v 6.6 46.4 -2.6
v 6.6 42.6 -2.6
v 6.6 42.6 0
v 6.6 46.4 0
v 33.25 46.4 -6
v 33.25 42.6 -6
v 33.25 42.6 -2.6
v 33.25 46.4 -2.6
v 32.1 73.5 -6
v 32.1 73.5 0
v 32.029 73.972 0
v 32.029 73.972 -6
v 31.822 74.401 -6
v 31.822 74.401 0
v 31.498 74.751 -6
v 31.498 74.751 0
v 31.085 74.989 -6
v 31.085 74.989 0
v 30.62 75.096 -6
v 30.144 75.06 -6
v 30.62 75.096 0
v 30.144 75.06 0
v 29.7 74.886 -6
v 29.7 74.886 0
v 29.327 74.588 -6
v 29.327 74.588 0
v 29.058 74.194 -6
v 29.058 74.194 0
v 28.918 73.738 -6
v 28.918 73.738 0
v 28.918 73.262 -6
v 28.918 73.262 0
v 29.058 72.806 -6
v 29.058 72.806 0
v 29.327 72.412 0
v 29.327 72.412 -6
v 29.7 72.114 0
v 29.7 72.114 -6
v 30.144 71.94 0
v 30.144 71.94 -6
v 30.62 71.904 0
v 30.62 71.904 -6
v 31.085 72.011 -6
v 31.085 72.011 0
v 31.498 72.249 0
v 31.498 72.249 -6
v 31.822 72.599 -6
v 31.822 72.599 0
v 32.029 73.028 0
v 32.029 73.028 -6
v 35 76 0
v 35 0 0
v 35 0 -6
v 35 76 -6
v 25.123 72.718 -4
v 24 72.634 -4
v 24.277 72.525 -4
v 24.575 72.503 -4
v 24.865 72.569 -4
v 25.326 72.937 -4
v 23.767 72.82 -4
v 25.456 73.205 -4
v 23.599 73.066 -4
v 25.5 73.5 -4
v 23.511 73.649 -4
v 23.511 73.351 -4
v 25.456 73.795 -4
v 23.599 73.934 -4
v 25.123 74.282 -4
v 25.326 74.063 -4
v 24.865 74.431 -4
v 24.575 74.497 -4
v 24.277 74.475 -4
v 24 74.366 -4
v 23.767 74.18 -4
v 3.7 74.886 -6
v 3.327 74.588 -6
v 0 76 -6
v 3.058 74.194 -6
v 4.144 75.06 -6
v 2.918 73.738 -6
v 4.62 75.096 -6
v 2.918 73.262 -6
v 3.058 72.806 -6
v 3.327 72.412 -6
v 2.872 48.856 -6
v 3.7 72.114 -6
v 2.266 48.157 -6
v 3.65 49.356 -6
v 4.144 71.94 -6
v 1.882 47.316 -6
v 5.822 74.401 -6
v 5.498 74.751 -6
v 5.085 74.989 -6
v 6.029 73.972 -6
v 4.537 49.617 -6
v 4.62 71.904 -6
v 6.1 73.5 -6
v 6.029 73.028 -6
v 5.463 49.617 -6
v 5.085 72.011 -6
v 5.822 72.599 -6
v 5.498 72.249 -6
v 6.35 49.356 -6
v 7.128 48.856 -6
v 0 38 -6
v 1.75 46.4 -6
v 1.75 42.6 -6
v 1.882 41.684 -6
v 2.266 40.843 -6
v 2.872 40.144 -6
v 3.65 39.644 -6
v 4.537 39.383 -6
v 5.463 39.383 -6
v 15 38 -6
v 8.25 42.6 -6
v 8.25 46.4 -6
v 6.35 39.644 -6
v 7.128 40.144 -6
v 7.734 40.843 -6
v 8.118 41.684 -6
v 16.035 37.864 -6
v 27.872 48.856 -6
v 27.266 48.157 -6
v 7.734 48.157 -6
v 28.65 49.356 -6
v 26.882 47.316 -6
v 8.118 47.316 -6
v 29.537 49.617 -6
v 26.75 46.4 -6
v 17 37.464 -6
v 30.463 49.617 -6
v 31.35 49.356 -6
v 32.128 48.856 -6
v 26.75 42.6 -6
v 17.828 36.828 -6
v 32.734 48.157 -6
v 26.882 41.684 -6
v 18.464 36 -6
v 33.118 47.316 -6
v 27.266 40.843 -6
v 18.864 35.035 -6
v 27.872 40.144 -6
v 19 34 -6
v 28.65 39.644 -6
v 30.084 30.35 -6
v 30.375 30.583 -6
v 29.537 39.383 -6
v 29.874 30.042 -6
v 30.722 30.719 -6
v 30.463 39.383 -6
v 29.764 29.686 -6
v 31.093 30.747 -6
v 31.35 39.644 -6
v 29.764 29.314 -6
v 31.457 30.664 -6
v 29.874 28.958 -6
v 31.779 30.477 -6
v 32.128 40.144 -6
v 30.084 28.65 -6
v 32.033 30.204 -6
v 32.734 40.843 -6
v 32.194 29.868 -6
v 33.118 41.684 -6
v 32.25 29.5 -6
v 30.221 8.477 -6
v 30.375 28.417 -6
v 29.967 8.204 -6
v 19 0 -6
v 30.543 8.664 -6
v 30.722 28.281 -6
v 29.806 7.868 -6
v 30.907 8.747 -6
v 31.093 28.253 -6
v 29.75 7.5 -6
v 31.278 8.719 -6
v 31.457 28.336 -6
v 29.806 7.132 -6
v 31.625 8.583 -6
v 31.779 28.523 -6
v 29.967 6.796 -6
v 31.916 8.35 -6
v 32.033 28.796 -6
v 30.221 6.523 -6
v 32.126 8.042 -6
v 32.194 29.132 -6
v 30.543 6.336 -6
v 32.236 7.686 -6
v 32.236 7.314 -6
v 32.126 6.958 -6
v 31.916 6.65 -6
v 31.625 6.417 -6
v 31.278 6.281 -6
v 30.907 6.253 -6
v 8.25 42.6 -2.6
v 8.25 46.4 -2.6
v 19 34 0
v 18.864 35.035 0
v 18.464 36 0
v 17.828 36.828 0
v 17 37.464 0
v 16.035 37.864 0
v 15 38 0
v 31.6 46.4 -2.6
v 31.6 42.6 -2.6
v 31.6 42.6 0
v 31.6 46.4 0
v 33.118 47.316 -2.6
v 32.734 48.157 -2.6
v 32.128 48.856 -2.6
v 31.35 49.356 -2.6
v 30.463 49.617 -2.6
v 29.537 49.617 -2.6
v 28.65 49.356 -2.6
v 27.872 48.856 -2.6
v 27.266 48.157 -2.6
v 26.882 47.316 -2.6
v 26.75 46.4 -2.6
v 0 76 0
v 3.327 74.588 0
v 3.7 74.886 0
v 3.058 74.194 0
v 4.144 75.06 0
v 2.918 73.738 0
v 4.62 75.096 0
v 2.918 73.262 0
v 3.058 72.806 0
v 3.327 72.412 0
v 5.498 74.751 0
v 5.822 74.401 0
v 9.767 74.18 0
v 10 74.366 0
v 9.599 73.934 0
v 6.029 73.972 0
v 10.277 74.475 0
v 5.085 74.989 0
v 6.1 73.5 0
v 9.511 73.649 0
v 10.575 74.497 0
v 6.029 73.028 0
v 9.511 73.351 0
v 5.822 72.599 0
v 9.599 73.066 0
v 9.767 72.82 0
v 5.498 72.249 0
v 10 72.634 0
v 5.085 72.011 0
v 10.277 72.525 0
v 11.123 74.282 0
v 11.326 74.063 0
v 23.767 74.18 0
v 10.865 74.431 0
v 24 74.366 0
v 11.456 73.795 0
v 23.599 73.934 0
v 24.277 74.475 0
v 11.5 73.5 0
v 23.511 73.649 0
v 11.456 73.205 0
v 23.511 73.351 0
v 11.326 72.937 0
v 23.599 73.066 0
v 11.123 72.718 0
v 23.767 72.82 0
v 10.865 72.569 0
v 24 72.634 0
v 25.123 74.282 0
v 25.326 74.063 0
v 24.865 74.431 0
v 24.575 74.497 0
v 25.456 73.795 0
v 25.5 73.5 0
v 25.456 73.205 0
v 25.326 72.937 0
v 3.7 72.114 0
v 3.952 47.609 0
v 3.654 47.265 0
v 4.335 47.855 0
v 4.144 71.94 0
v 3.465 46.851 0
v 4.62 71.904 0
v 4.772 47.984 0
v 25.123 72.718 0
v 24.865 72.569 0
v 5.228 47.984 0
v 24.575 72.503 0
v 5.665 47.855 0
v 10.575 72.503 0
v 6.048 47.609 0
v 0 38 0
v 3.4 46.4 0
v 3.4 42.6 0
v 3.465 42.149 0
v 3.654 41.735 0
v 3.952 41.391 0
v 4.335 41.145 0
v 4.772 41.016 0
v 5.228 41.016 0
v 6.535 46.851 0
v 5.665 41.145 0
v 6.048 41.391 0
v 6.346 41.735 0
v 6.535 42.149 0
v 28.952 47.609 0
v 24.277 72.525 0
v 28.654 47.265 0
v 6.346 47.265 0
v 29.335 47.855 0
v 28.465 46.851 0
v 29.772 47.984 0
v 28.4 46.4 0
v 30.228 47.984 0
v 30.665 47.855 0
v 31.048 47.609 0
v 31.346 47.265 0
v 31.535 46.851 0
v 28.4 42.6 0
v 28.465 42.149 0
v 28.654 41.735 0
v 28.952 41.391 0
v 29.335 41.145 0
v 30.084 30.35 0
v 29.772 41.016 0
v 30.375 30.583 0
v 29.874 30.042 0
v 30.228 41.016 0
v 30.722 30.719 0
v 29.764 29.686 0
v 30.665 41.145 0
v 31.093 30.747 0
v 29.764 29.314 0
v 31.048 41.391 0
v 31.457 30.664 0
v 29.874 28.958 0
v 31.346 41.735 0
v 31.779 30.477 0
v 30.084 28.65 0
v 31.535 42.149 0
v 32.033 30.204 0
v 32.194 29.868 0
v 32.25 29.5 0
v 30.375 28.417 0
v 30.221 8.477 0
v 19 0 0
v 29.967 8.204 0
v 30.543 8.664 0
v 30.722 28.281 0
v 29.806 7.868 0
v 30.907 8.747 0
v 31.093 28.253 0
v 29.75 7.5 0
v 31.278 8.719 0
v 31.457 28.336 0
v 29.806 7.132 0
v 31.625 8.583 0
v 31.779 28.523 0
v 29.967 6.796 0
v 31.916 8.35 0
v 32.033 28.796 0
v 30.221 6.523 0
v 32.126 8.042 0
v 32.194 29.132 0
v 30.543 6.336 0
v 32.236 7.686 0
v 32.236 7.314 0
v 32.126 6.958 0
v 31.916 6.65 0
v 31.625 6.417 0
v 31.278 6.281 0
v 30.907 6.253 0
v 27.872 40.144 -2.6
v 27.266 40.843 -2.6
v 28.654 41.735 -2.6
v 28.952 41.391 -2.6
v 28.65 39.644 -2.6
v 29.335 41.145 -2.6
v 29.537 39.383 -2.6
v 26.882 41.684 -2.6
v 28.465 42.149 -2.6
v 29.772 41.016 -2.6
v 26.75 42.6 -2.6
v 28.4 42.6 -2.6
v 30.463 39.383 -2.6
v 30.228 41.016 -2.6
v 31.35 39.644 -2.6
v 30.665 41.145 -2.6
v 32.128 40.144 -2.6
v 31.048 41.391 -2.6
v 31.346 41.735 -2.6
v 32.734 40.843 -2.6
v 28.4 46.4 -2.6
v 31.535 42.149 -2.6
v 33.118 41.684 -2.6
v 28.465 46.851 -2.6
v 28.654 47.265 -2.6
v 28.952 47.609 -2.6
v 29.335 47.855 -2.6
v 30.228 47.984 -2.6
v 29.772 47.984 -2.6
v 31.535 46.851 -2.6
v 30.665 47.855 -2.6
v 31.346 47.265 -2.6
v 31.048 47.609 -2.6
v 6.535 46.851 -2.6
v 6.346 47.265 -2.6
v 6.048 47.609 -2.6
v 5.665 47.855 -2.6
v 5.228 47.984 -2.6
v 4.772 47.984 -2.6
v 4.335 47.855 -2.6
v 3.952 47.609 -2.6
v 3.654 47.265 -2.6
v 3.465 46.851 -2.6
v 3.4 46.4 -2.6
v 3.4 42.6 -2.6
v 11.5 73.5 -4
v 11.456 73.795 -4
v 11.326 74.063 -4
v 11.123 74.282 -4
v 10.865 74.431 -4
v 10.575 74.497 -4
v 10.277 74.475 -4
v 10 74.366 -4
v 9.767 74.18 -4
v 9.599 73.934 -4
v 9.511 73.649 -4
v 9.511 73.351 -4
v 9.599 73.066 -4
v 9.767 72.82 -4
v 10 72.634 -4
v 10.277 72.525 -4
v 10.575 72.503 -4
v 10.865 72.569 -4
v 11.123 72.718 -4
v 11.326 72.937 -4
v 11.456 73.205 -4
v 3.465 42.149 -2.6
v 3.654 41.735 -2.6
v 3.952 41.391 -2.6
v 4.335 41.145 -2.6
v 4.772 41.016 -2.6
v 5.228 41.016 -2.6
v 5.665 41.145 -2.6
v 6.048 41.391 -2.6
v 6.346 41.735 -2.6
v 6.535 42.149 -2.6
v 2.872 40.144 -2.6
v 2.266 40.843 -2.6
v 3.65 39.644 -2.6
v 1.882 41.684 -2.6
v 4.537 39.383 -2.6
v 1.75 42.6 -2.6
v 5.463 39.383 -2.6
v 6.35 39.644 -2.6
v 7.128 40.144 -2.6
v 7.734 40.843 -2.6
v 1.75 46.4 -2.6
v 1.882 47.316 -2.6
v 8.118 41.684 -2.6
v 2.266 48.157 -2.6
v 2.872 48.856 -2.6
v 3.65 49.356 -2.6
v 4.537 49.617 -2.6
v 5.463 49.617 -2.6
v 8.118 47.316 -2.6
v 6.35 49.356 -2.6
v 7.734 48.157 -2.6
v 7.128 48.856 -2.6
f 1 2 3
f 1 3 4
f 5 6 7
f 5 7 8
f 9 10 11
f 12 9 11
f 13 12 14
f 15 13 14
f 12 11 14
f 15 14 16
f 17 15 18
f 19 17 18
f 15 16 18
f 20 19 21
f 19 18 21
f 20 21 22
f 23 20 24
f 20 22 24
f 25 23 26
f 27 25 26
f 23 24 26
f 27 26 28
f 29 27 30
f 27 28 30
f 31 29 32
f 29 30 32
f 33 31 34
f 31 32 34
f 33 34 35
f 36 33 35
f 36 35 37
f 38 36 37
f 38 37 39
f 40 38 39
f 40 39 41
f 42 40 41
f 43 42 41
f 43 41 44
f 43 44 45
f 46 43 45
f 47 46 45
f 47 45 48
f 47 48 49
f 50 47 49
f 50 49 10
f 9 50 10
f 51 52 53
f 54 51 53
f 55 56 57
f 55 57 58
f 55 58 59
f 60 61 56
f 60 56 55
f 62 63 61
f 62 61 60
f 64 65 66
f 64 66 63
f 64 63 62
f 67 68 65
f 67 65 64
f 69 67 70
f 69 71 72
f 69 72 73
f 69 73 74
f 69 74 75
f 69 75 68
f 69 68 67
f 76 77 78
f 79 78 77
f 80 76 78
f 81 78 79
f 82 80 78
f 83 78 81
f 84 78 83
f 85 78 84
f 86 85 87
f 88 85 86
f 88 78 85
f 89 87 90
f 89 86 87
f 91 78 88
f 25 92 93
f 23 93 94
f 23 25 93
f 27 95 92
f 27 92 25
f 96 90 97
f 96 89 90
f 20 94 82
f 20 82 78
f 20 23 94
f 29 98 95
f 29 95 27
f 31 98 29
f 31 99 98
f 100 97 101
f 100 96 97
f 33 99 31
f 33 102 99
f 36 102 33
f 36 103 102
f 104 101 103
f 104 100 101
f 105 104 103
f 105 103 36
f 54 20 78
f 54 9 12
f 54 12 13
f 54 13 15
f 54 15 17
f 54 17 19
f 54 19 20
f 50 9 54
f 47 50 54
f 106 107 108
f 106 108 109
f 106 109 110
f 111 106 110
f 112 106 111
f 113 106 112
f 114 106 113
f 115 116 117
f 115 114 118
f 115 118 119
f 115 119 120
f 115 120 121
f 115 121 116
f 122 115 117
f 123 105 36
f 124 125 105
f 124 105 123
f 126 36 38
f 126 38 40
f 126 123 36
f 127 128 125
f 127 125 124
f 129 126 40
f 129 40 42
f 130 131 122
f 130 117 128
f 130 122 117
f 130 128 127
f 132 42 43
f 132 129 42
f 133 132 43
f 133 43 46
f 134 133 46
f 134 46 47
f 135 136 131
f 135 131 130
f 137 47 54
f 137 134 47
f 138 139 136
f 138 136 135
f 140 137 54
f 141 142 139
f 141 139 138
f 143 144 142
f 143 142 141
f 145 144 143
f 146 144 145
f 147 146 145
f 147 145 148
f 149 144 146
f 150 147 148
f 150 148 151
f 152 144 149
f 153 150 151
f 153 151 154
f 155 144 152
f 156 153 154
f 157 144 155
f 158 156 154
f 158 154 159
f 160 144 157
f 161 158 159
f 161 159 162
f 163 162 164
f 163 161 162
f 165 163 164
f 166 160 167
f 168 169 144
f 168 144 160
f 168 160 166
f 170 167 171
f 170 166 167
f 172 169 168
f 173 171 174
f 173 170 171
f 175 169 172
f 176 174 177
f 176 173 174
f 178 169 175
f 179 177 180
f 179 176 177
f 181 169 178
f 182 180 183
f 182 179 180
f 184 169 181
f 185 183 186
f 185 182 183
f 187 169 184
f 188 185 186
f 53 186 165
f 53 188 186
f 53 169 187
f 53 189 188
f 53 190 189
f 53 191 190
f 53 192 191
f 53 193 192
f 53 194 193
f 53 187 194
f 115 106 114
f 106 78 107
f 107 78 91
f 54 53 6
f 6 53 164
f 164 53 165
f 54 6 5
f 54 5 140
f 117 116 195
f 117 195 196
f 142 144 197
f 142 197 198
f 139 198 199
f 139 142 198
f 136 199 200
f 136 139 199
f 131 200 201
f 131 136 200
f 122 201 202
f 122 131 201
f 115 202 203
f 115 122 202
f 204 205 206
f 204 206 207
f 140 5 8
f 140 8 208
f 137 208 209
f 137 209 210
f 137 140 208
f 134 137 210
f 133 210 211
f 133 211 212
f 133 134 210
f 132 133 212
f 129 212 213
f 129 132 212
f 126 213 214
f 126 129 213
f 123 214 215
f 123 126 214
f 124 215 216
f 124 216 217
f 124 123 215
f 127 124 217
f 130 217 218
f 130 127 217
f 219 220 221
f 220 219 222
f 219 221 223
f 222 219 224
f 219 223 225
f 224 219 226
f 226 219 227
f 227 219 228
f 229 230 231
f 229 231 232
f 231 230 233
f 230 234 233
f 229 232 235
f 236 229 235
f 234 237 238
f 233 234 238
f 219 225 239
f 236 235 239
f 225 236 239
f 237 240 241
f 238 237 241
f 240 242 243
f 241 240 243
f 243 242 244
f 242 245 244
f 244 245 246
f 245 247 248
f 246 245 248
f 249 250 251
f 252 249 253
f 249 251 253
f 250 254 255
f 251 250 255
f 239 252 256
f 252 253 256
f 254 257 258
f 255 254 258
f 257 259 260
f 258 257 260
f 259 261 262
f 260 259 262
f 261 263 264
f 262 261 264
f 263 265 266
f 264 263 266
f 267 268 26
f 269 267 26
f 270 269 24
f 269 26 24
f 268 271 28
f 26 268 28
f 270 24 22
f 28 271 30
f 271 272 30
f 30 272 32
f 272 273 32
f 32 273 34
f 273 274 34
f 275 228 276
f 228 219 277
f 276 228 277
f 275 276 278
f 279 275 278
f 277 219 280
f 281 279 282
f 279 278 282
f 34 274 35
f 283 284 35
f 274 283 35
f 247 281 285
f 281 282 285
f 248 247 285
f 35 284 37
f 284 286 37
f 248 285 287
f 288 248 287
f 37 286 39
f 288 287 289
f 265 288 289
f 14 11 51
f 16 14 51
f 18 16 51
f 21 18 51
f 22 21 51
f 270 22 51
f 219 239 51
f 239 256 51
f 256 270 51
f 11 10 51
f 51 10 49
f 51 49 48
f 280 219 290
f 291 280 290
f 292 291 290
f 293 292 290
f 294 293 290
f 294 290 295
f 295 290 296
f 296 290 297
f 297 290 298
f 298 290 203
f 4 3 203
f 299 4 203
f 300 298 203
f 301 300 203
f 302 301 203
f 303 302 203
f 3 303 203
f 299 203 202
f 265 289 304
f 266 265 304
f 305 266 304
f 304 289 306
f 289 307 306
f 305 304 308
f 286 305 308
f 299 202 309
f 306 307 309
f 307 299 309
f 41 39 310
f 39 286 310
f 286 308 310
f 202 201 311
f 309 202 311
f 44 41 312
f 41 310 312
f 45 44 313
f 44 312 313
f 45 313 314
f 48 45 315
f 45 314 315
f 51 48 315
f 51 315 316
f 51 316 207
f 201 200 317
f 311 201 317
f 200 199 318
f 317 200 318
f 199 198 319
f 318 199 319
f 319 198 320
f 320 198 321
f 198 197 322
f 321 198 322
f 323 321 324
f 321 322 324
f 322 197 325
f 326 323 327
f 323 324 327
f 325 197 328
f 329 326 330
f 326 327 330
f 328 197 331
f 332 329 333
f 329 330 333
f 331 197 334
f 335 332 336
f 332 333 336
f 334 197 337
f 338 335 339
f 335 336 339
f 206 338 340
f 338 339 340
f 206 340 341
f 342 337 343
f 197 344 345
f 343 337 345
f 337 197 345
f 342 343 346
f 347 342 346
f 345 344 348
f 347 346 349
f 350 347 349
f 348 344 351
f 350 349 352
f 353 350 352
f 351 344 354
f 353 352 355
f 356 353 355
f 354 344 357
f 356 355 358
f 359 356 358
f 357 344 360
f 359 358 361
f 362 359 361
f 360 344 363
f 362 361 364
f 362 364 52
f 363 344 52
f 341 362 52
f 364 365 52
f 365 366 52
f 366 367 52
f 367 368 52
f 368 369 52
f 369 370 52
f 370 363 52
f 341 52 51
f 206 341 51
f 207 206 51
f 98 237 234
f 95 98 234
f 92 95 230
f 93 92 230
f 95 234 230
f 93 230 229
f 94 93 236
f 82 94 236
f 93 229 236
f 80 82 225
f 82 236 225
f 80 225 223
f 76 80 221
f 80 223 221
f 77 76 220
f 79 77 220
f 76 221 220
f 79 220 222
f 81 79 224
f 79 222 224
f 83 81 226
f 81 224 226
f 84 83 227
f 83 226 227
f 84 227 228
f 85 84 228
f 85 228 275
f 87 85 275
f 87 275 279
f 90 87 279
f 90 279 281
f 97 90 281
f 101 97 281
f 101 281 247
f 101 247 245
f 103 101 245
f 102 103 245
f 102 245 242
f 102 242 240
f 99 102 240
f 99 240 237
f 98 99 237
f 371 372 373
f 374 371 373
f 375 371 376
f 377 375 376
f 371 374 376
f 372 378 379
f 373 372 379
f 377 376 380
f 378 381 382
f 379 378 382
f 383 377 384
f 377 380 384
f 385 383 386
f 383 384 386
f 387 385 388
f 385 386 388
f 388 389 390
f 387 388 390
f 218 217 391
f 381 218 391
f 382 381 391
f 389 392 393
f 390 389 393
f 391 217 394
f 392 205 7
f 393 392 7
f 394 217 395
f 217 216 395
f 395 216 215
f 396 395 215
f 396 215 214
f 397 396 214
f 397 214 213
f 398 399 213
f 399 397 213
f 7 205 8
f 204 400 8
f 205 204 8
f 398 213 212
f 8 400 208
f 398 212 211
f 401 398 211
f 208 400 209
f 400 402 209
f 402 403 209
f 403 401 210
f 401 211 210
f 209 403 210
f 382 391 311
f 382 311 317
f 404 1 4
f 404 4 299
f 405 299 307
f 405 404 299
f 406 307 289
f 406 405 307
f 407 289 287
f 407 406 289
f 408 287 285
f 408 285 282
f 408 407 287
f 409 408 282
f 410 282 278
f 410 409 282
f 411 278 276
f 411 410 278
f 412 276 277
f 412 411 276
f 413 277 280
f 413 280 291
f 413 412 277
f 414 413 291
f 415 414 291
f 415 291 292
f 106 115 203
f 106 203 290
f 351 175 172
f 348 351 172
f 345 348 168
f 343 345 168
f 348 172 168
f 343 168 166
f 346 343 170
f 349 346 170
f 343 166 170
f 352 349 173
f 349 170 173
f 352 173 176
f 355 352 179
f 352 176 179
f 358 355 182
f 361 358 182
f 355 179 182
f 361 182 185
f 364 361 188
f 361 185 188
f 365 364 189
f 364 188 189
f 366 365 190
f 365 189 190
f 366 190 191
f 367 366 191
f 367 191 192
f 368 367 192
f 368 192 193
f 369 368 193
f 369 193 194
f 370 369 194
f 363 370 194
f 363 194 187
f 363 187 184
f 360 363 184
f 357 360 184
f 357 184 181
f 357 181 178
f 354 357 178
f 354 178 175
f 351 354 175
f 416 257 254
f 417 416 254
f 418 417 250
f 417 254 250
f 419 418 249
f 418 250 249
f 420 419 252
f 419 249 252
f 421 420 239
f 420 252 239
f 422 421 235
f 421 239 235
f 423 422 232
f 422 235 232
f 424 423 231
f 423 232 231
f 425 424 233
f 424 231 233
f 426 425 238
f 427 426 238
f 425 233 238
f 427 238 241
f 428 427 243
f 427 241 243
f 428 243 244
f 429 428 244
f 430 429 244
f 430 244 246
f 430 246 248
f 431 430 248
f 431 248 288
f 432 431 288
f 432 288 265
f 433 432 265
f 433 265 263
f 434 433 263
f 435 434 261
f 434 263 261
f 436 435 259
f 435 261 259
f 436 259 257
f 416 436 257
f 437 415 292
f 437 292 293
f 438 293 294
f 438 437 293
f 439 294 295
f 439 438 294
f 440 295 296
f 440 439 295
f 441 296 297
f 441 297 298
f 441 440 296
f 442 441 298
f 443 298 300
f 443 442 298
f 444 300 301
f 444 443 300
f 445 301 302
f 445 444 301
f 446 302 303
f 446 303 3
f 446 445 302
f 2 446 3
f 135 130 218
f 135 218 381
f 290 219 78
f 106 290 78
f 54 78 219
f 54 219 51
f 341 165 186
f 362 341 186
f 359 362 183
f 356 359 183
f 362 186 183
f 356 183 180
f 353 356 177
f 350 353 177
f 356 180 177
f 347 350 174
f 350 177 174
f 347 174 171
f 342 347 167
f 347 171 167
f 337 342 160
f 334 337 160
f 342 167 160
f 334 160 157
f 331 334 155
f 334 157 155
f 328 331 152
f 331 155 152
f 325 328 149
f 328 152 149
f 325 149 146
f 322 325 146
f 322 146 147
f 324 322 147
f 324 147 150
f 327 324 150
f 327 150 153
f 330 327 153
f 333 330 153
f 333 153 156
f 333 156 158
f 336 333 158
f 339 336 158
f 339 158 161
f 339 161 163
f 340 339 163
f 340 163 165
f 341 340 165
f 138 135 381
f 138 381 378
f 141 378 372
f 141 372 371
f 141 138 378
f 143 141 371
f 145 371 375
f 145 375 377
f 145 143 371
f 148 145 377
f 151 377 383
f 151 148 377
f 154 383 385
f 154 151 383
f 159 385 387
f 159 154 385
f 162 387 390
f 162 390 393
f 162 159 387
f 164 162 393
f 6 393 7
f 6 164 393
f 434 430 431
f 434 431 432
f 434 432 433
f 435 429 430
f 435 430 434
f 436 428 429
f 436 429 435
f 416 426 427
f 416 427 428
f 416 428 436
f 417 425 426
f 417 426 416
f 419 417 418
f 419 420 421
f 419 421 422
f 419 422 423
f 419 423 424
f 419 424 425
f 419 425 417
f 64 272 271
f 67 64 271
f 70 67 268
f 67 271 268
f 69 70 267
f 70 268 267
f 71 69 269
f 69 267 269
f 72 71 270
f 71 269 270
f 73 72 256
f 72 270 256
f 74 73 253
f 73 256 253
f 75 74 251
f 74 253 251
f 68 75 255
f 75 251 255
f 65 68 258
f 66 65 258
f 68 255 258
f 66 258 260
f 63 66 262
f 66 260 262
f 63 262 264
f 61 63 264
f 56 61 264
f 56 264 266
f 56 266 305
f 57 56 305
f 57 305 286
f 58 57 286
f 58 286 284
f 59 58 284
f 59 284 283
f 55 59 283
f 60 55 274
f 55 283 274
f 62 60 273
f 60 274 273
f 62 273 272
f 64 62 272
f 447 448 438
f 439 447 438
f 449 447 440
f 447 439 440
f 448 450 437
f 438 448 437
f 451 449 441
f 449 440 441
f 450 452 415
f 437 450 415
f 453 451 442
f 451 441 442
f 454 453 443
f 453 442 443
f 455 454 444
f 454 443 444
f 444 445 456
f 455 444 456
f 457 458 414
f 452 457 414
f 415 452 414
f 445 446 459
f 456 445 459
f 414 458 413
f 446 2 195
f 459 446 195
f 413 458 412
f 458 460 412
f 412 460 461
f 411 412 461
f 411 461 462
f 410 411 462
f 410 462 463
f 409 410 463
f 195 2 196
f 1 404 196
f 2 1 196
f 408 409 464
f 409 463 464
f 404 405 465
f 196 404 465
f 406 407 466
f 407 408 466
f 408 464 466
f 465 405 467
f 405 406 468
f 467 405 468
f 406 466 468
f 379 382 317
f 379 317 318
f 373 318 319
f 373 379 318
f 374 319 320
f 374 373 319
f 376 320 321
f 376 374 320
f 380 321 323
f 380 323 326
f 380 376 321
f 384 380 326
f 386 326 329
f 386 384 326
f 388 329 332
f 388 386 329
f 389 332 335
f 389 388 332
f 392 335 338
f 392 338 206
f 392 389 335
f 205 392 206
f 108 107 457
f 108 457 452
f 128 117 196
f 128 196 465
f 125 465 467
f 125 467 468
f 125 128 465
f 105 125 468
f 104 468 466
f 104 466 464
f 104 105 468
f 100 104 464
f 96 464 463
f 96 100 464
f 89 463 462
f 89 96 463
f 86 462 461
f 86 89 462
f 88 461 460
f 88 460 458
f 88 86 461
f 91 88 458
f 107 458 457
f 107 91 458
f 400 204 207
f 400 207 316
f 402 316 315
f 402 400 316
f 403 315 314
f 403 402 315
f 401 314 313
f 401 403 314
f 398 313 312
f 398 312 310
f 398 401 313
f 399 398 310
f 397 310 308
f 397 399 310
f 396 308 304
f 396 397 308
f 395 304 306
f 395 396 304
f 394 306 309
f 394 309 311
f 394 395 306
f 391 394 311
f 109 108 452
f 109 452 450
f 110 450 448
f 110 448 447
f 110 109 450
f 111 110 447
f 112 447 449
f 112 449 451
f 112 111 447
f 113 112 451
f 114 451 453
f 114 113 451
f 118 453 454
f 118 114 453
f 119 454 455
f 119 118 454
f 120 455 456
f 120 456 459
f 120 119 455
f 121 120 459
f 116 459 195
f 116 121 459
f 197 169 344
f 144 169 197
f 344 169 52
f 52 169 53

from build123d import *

# Parameters (mm, degrees)
SKETCH1_W                                      = 35
SKETCH1_H                                      = 6
BOSS_EXTRUDE1_DEPTH                            = 76
SKETCH2_R                                      = 1.6
CUT_EXTRUDE1_DEPTH                             = 84.886828525
SKETCH3_R                                      = 1
CUT_EXTRUDE2_DEPTH                             = 4
CBORE_START                                    = -6
CBORE_SLOT_FOR_M3_HEX_SOCKET_HEAD_CAP_SC_DEPTH = 3.4
CBORE_START_2                                  = -2.6
CBORE_SLOT_FOR_M3_HEX_SOCKET_HEAD_CA_3_DEPTH   = 2.6
CUT_EXTRUDE3_DEPTH                             = 84.886828525
SKETCH8_R                                      = 1.25
CUT_EXTRUDE4_DEPTH                             = 84.886828525


# Read off the part's stored shape, not the designer's step: CBORE SLOT for M3 Hex Socket Head Cap Screw1
with BuildPart() as part:
    # Sketch1 → Boss-Extrude1 (new body)
    with BuildSketch(Plane(origin=(0, 0, 0), x_dir=(1, 0, 0), z_dir=(0, 1, 0))):
        with Locations((17.5, 3)):
            Rectangle(SKETCH1_W, SKETCH1_H)
    extrude(amount=BOSS_EXTRUDE1_DEPTH)

    # Sketch2 → Cut-Extrude1 (cut, through all)
    with BuildSketch(Plane.XY):
        with Locations((4.5, 73.5)):
            Circle(SKETCH2_R)
        with Locations((30.5, 73.5)):
            Circle(SKETCH2_R)
    extrude(amount=-CUT_EXTRUDE1_DEPTH, mode=Mode.SUBTRACT)

    # Sketch3 → Cut-Extrude2 (cut)
    with BuildSketch(Plane.XY):
        with Locations((10.5, 73.5)):
            Circle(SKETCH3_R)
        with Locations((24.5, 73.5)):
            Circle(SKETCH3_R)
    extrude(amount=-CUT_EXTRUDE2_DEPTH, mode=Mode.SUBTRACT)

    # CBORE SLOT for M3 Hex Socket Head Ca 2 → CBORE SLOT for M3 Hex Socket Head Cap Screw1 (cut)
    with BuildSketch(Plane.XY.offset(CBORE_START)):
        with BuildLine():
            ThreePointArc((8.25, 46.4), (5, 49.65), (1.75, 46.4))
            Line((1.75, 46.4), (1.75, 42.6))
            ThreePointArc((1.75, 42.6), (5, 39.35), (8.25, 42.6))
            Line((8.25, 42.6), (8.25, 46.4))
        make_face()
        with BuildLine():
            ThreePointArc((33.25, 46.4), (30, 49.65), (26.75, 46.4))
            Line((26.75, 46.4), (26.75, 42.6))
            ThreePointArc((26.75, 42.6), (30, 39.35), (33.25, 42.6))
            Line((33.25, 42.6), (33.25, 46.4))
        make_face()
    extrude(amount=CBORE_SLOT_FOR_M3_HEX_SOCKET_HEAD_CAP_SC_DEPTH, mode=Mode.SUBTRACT)

    # CBORE SLOT for M3 Hex Socket Head Ca 3 o → CBORE SLOT for M3 Hex Socket Head Ca 3 (cut)
    with BuildSketch(Plane.XY.offset(CBORE_START_2)):
        with BuildLine():
            ThreePointArc((6.6, 46.4), (5, 48), (3.4, 46.4))
            Line((3.4, 46.4), (3.4, 42.6))
            ThreePointArc((3.4, 42.6), (5, 41), (6.6, 42.6))
            Line((6.6, 42.6), (6.6, 46.4))
        make_face()
        with BuildLine():
            ThreePointArc((31.6, 46.4), (30, 48), (28.4, 46.4))
            Line((28.4, 46.4), (28.4, 42.6))
            ThreePointArc((28.4, 42.6), (30, 41), (31.6, 42.6))
            Line((31.6, 42.6), (31.6, 46.4))
        make_face()
    extrude(amount=CBORE_SLOT_FOR_M3_HEX_SOCKET_HEAD_CA_3_DEPTH, mode=Mode.SUBTRACT)

    # Sketch7 → Cut-Extrude3 (cut, through all)
    with BuildSketch(Plane(origin=(0, 0, -6), x_dir=(-1, 0, 0), z_dir=(0, 0, -1))):
        with BuildLine():
            Line((0, 0), (-19, 0))
            Line((-19, 0), (-19, 34))
            ThreePointArc((-19, 34), (-17.828427125, 36.828427125), (-15, 38))
            Line((-15, 38), (0, 38))
            Line((0, 38), (0, 0))
        make_face()
    extrude(amount=-CUT_EXTRUDE3_DEPTH, mode=Mode.SUBTRACT)

    # Sketch8 → Cut-Extrude4 (cut, through all)
    with BuildSketch(Plane(origin=(0, 0, -6), x_dir=(-1, 0, 0), z_dir=(0, 0, -1))):
        with Locations((-31, 7.5)):
            Circle(SKETCH8_R)
        with Locations(Location((-31, 29.5, 0), (0, 0, 180))):
            Circle(SKETCH8_R)
    extrude(amount=-CUT_EXTRUDE4_DEPTH, mode=Mode.SUBTRACT)


solid = part.part
